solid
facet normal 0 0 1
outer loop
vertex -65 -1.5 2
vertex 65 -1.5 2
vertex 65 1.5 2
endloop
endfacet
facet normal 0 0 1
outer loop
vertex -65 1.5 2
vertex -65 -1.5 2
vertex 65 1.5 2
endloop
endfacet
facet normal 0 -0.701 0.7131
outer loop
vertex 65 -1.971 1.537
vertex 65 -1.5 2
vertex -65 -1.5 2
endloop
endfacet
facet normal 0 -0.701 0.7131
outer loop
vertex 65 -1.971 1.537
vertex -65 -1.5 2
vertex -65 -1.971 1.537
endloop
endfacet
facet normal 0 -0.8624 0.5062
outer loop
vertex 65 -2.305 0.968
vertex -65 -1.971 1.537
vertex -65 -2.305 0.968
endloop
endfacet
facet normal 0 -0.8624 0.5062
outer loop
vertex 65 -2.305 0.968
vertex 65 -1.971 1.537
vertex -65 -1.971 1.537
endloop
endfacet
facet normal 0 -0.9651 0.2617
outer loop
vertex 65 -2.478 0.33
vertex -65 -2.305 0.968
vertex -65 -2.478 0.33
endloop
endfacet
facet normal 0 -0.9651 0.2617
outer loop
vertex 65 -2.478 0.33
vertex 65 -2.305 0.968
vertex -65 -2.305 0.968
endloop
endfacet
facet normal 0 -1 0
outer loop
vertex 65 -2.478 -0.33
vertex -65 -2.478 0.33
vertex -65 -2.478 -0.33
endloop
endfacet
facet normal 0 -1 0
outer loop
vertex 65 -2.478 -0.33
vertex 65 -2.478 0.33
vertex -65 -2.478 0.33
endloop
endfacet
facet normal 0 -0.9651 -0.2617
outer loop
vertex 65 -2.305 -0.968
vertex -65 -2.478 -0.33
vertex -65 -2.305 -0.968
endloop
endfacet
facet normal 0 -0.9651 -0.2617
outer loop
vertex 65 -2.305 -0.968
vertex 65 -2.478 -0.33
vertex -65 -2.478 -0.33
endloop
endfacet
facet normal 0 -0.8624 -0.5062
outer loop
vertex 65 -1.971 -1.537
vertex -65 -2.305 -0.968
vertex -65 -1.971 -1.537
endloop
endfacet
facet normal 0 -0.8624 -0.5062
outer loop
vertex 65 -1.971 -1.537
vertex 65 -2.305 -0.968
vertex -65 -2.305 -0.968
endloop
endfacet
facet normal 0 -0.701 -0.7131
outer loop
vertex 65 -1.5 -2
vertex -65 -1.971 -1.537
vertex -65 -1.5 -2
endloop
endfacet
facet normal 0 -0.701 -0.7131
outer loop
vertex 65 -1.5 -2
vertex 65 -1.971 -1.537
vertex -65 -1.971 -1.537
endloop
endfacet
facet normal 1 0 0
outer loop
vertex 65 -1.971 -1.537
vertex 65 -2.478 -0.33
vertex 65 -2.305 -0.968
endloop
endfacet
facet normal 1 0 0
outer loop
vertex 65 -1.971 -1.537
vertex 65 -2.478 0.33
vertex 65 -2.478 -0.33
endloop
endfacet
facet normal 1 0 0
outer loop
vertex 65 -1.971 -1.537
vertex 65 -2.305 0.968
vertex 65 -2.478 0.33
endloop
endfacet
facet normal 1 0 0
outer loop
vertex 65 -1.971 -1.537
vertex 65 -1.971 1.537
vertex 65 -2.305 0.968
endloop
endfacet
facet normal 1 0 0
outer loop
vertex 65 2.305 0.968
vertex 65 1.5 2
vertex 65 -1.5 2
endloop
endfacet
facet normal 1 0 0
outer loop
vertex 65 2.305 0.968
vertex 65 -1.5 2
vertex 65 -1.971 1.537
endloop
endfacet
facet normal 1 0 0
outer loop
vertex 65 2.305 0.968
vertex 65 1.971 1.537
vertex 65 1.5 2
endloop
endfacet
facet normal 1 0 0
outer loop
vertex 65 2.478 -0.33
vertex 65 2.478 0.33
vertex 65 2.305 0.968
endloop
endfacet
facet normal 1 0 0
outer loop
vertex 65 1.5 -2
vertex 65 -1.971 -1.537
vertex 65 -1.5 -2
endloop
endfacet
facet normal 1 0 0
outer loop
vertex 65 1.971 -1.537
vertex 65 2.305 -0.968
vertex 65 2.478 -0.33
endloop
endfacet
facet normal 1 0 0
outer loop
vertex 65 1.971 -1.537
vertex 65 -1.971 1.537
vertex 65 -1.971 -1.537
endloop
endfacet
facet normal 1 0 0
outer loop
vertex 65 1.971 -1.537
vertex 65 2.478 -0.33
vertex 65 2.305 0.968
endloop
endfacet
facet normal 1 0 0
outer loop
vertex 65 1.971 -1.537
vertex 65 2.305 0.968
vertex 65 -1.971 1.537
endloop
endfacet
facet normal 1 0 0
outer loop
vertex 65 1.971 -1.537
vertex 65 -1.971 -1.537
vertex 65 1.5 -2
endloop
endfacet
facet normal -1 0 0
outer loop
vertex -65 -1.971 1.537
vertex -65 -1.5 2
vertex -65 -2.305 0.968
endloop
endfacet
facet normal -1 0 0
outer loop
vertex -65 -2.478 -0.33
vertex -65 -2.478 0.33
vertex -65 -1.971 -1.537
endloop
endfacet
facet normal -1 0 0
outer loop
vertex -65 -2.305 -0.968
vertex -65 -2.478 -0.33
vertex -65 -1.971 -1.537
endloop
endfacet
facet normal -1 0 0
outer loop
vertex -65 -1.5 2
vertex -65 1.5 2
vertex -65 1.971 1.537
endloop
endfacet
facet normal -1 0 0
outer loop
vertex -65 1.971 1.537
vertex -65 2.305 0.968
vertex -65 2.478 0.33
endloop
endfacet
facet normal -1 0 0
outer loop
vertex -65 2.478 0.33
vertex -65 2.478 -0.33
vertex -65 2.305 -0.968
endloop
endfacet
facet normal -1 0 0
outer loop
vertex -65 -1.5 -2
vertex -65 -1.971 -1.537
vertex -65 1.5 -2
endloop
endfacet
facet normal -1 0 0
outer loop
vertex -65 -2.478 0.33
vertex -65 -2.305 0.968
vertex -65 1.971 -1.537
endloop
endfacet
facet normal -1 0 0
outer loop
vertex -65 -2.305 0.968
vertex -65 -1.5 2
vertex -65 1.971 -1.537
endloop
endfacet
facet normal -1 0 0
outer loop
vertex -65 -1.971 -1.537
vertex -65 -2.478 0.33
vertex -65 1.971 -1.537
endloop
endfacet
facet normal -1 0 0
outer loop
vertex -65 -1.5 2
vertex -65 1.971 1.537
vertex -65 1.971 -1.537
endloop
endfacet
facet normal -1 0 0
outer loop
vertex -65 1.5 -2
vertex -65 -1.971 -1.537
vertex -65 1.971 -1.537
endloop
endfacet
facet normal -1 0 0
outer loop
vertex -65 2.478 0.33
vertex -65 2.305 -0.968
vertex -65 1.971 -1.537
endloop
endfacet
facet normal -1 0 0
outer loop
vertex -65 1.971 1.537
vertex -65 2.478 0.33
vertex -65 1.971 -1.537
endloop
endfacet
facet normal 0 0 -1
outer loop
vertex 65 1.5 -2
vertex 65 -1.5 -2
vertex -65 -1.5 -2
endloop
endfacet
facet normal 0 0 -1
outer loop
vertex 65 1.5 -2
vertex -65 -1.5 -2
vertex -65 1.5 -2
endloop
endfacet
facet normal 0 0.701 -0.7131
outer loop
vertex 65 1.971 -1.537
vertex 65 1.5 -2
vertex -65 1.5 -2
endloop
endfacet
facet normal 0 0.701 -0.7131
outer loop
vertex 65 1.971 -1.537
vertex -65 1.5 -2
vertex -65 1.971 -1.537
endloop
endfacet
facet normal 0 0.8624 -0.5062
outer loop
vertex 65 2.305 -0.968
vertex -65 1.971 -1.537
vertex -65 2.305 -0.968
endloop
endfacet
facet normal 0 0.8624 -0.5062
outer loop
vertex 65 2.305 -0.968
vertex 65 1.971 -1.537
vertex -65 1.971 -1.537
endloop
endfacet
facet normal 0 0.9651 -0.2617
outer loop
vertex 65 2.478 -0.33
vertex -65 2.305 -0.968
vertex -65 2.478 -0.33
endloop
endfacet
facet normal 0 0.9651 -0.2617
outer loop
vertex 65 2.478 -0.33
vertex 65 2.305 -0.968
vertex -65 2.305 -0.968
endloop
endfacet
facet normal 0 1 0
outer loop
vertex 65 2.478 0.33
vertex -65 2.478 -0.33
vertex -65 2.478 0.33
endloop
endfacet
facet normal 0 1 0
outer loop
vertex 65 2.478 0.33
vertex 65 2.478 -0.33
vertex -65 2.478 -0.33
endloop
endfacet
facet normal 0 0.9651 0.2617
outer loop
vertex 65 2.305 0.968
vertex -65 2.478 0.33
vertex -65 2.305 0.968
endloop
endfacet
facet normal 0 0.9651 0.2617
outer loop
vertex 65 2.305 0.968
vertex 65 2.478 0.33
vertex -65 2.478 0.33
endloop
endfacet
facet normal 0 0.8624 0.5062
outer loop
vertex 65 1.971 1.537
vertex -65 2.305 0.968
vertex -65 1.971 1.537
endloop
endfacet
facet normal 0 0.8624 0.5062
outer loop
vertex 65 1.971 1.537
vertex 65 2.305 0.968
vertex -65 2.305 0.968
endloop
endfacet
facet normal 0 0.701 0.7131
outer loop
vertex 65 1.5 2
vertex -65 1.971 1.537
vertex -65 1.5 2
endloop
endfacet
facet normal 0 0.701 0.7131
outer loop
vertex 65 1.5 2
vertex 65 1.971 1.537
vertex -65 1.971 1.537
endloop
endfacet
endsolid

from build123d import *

# Parameters (mm, degrees)
ESBO_O1_R                = 2.5
RESSALTO_EXTRUS_O1_DEPTH = 65
ESBO_O2_W                = 7.122508342
ESBO_O2_H                = 3.466033472
CORTE_EXTRUS_O1_DEPTH    = 130


with BuildPart() as part:
    # Esboço1 → Ressalto-extrusão1 (new, symmetric)
    with BuildSketch(Plane.YZ):
        with Locations(Location((0, 0, 0), (0, 0, 270))):
            Circle(ESBO_O1_R)
    extrude(amount=RESSALTO_EXTRUS_O1_DEPTH, both=True)

    # Esboço2 → Corte-extrusão1 (cut)
    with BuildSketch(Plane.YZ.offset(65)):
        with Locations((0.399926939, 3.733016736)):
            Rectangle(ESBO_O2_W, ESBO_O2_H)
    corte_extrus_o1 = extrude(amount=-CORTE_EXTRUS_O1_DEPTH, mode=Mode.SUBTRACT)

    # Espelhar1: Corte-extrusão1 across plane
    add(corte_extrus_o1.mirror(Plane.XY), mode=Mode.SUBTRACT)


solid = part.part
